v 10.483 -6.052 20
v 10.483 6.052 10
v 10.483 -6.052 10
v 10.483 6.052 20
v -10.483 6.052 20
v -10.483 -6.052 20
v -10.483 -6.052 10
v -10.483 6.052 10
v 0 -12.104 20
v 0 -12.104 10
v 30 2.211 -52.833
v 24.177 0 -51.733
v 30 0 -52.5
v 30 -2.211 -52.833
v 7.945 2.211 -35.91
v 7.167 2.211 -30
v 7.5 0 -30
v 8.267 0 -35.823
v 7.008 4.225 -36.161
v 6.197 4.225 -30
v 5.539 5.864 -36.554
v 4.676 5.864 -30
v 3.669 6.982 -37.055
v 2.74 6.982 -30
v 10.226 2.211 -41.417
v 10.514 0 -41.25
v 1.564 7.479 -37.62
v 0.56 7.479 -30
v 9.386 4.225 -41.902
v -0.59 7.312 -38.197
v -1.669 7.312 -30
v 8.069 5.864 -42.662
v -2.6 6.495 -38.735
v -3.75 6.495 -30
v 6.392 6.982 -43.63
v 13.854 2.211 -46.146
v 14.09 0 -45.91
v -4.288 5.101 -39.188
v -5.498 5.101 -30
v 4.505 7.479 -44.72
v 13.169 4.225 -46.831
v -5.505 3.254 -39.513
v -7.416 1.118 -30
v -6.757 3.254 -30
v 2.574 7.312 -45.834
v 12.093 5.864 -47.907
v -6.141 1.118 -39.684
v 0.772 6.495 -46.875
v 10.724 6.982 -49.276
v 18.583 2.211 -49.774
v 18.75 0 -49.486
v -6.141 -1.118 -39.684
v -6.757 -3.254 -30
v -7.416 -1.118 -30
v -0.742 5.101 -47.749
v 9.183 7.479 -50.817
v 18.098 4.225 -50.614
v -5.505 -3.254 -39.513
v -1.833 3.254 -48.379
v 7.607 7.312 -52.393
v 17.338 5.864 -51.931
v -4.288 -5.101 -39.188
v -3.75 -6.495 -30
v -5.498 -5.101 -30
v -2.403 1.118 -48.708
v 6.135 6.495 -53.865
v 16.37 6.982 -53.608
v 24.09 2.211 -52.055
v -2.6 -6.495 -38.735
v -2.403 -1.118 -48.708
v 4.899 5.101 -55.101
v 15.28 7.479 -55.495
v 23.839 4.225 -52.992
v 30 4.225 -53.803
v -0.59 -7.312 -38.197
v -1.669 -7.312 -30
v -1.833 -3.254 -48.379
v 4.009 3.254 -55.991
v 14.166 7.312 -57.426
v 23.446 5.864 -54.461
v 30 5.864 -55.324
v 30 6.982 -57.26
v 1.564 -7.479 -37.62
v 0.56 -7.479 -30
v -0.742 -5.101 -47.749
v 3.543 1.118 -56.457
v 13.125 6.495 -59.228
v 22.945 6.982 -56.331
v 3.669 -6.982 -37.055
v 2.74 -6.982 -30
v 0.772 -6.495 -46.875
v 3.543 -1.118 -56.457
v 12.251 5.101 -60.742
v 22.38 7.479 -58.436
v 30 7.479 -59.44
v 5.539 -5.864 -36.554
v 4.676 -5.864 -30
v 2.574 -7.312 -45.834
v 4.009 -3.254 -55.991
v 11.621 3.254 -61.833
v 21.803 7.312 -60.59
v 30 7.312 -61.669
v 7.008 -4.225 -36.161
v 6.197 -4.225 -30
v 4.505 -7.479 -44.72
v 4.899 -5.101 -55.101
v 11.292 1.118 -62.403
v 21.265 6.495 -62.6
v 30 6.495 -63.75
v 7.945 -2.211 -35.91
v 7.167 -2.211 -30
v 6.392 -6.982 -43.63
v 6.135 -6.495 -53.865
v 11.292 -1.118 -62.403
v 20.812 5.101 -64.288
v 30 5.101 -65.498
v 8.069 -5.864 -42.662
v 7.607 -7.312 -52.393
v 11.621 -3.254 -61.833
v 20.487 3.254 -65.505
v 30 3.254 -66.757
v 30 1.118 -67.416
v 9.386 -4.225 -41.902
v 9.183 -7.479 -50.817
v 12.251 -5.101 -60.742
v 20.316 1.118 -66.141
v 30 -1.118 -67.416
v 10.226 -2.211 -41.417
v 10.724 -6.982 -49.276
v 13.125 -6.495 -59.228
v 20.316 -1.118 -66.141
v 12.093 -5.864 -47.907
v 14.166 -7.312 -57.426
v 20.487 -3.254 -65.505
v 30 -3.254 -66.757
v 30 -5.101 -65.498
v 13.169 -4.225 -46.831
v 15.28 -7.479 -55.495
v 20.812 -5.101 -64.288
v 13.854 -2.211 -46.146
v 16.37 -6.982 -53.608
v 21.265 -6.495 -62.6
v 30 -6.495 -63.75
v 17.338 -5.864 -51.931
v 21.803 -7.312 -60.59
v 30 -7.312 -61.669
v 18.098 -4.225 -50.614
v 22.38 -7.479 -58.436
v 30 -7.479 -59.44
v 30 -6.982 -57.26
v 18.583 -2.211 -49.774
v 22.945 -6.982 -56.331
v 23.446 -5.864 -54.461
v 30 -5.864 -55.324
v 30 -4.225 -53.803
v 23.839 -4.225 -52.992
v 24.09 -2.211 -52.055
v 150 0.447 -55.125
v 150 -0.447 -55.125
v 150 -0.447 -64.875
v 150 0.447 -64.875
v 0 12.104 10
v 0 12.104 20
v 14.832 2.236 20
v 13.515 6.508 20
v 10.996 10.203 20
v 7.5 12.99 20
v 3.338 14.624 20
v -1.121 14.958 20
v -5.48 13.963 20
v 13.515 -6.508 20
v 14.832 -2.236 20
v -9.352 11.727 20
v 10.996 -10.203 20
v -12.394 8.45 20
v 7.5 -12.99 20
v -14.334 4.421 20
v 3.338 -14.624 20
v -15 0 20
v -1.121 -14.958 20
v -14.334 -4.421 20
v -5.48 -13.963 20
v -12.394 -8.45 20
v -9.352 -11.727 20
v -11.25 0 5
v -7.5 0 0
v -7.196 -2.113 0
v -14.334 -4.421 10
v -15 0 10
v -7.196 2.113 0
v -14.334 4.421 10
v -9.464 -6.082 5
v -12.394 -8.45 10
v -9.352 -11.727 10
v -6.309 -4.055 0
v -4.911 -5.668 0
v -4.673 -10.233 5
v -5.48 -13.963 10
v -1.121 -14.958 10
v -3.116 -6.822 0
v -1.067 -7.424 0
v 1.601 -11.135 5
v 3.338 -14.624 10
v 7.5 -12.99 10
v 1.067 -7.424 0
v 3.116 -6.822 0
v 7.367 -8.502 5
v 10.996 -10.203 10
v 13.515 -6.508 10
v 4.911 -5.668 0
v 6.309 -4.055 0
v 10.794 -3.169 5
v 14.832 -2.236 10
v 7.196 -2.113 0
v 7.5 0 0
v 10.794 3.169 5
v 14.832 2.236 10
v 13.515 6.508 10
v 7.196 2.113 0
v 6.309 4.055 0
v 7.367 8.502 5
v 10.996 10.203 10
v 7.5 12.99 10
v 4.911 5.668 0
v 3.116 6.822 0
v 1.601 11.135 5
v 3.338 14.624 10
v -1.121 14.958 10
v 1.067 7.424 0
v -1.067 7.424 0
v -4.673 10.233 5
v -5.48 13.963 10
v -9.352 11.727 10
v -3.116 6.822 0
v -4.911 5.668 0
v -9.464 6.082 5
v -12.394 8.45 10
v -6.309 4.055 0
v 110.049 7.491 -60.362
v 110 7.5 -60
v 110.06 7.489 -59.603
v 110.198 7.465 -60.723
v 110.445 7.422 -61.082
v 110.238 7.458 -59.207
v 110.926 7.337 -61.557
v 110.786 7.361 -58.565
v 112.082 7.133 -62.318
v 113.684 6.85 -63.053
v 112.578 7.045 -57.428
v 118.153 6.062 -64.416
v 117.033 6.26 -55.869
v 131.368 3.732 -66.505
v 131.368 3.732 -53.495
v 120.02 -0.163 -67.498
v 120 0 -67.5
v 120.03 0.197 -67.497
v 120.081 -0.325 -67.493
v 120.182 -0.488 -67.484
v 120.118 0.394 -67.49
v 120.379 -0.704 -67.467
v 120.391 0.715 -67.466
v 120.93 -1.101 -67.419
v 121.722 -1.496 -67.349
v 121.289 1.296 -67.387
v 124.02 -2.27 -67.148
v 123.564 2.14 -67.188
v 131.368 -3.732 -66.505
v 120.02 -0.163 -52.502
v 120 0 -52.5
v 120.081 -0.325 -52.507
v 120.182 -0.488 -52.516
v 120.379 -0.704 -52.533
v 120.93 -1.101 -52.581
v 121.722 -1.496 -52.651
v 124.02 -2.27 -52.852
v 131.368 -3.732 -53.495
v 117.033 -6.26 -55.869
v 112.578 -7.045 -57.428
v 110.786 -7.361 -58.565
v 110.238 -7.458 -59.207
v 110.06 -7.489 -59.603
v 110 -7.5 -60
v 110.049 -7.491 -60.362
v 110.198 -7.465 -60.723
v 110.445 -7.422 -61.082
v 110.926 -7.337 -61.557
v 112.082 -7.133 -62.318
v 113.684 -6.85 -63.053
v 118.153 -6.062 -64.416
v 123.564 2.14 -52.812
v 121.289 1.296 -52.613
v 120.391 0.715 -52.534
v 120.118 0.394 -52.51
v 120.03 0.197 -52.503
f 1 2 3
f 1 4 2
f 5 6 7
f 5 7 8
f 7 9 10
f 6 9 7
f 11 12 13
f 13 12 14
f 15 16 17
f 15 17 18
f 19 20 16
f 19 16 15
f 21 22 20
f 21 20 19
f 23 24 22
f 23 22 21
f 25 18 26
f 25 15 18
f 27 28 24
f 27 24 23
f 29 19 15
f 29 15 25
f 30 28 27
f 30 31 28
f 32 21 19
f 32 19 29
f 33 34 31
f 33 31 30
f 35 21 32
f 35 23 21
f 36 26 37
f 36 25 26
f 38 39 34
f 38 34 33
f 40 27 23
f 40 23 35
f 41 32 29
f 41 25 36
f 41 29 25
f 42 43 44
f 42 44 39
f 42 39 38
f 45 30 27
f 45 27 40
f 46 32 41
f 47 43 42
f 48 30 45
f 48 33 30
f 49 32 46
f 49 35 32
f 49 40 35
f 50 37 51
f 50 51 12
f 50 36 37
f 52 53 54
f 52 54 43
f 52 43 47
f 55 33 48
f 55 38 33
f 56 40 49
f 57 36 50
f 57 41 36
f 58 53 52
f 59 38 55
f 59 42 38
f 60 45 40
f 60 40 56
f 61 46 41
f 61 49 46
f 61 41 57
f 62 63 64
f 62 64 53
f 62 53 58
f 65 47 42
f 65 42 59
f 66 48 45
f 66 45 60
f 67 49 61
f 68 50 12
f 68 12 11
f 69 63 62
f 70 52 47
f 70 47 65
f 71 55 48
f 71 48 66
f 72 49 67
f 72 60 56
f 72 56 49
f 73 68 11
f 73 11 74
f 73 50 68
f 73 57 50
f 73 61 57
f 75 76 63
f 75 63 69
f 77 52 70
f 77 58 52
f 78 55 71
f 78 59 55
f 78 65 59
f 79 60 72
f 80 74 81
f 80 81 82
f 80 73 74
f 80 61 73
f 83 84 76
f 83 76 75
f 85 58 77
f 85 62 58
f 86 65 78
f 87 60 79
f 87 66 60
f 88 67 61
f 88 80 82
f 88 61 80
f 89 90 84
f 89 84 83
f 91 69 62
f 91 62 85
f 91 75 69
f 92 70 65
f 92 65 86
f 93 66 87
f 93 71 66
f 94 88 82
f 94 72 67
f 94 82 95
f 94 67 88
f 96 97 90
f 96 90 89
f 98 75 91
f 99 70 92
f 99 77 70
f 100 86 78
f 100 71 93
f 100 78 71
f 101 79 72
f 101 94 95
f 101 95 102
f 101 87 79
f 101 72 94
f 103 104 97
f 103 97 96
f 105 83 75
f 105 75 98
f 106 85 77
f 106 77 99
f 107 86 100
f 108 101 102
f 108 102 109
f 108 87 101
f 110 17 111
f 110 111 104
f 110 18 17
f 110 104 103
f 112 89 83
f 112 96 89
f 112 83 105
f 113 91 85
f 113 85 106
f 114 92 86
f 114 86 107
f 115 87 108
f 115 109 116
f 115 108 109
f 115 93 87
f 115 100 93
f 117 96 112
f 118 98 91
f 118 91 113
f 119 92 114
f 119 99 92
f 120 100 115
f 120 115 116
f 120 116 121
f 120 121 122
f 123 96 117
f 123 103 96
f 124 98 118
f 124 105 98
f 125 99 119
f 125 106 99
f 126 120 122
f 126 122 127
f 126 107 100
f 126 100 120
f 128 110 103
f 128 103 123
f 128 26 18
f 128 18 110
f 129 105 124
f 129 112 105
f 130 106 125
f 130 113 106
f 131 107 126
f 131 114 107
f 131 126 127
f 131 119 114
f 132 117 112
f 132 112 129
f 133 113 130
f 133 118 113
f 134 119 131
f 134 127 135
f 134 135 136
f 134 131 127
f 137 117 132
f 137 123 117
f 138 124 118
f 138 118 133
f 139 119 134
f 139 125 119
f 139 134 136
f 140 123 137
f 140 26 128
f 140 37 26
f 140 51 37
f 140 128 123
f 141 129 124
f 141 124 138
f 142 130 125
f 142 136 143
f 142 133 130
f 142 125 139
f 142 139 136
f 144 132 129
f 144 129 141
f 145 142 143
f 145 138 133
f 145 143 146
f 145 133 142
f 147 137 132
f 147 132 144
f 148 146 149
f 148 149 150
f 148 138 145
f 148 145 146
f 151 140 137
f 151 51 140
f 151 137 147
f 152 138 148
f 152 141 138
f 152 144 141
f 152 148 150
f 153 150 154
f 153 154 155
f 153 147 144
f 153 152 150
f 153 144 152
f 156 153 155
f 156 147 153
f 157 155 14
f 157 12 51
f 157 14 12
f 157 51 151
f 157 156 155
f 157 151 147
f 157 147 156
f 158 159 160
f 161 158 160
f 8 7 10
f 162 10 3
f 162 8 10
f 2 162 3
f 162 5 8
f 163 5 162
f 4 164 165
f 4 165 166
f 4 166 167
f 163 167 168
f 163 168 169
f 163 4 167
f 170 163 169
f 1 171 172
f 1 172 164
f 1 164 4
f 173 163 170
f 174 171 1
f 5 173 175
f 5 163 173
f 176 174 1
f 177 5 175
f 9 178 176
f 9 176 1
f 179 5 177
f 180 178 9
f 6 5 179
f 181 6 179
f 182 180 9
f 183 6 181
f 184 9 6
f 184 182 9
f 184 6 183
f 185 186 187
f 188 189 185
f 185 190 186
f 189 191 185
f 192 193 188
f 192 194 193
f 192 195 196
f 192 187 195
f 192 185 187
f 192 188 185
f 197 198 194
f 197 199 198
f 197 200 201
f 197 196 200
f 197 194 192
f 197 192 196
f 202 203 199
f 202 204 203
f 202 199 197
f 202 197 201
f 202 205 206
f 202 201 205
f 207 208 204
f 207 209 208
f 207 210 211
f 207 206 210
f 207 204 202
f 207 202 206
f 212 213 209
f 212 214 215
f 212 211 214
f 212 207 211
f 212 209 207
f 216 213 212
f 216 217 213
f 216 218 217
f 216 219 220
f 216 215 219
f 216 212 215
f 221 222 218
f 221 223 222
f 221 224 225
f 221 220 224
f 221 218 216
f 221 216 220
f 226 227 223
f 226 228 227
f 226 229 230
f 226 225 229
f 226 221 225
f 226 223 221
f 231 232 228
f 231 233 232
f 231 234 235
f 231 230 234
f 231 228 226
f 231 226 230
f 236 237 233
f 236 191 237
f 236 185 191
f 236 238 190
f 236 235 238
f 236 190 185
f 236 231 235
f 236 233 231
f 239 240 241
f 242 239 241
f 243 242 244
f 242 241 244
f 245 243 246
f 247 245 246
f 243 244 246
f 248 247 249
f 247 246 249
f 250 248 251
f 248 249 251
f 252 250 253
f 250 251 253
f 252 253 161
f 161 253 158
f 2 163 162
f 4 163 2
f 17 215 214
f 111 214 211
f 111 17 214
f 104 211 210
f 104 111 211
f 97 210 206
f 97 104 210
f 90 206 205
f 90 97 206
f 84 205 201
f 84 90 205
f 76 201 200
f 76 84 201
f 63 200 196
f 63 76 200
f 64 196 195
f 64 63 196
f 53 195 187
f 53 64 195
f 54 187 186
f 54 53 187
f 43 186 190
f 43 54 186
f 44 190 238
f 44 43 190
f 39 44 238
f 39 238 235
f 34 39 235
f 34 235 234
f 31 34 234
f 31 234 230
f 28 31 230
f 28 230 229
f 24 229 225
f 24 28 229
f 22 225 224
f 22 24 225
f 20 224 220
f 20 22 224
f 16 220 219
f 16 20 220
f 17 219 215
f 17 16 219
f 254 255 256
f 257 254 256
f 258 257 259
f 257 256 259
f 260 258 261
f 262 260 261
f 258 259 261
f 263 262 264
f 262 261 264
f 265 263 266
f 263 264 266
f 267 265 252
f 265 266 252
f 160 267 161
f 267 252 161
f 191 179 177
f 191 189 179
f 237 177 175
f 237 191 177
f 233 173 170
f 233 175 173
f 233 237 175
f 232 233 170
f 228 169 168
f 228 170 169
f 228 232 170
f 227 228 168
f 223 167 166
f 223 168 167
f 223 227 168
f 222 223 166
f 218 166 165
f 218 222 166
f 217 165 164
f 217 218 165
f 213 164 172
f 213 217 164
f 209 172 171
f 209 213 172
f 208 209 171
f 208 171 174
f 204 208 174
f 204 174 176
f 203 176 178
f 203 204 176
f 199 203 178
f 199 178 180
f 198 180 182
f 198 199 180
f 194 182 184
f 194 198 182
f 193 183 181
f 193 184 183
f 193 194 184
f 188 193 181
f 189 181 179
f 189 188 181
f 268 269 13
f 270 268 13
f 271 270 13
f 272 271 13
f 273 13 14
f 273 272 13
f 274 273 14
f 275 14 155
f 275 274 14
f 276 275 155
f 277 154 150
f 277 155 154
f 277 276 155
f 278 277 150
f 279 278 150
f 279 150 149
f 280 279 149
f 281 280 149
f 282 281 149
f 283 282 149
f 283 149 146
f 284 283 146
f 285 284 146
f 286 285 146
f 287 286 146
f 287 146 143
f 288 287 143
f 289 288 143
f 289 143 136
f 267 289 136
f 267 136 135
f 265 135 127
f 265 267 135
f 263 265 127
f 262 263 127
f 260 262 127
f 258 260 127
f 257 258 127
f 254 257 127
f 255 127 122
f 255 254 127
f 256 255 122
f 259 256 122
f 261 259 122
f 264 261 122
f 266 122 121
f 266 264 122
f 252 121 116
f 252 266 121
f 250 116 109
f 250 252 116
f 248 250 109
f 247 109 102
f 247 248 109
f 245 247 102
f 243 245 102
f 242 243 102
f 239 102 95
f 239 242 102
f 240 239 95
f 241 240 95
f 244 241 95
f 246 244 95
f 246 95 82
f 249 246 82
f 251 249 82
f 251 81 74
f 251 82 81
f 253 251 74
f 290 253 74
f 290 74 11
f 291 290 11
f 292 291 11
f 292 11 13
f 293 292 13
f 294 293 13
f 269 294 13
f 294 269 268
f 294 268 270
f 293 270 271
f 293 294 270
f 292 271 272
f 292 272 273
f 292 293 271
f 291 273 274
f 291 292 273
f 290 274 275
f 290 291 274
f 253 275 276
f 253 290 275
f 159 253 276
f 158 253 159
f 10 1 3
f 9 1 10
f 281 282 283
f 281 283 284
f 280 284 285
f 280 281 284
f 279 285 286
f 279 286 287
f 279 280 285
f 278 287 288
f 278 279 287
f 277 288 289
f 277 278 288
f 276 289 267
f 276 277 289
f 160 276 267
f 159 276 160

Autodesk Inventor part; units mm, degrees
ref_plane "YZ Plane" through (0, 0, 0) normal (1, 0, 0) x (0, 1, 0)
ref_plane "XZ Plane" through (0, 0, 0) normal (0, 1, 0) x (-1, 0, 0)
ref_plane "XY Plane" through (0, 0, 0) normal (0, 0, 1) x (1, 0, 0)
sketch "Эскиз1" plane through (0, 0, 0) normal (0, 1, 0) x (-1, 0, 0)
  line L0 (0, 0) -> (0, -30)
  line L1 (-30, -60) -> (-150, -60)
  arc A0 (-30, -60) -> (0, -30) centre (-30, -30) ccw
  point P0 (0, -60)
  dimension "d0" = 60
  dimension "d1" = 150
  dimension "d2" = 30
sketch "Эскиз2" plane through (0, 0, 0) normal (0, 0, 1) x (1, 0, 0)
  circle A0 centre (0, 0) radius 7.5
  dimension "d3" = 15
sweep "Сдвиг1" add profiles "Эскиз2" path "Эскиз1"
sketch "Эскиз3" plane through (0, 0, 0) normal (0, 1, 0) x (-1, 0, 0)
  line L0 (-120, -52.5) -> (-150, -55.1247)
  line L1 (-120, -67.5) -> (-150, -64.8753)
  line L2 (-150, -64.8753) -> (-150, -55.1247)
  line L3 (-150, -52.5) -> (-150, -67.5) projected
  line L4 (-120, -52.5) -> (-150.8821, -45.0422)
  line L5 (-150.8821, -45.0422) -> (-158.2895, -61.433)
  line L6 (-158.2895, -61.433) -> (-150, -78.5011)
  line L7 (-150, -78.5011) -> (-120, -67.5)
  point P0 (0, 0)
extrude "Выдавливание1" cut sketch "Эскиз3" against normal mid plane 40
sketch "Эскиз4" plane through (0, 0, 0) normal (0, 0, 1) x (1, 0, 0)
  line L0 (30, 7.5) -> (150, 7.5) projected
  line L1 (110, 7.5) -> (150.3931, 7.5) construction
  line L2 (30, -7.5) -> (150, -7.5) projected
  line L3 (110, 7.5) -> (159.1062, 20.8998)
  line L4 (159.1062, 20.8998) -> (172.0854, -18.5057)
  line L5 (172.0854, -18.5057) -> (124.0272, -32.5373)
  line L6 (124.0272, -32.5373) -> (110, -7.5)
  line L7 (110, 7.5) -> (150, 0.4469)
  line L8 (150, -5.6992) -> (150, 5.6992) projected
  line L9 (110, 7.5) -> (150.6171, 7.5) construction
  line L10 (110, -7.5) -> (150, -0.4469)
  line L11 (150, 0.4469) -> (150, -0.4469)
  point P0 (0, 0)
  dimension "d13" = 10
extrude "Выдавливание2" cut sketch "Эскиз4" against normal blind 120
sketch "Эскиз5" plane through (0, 0, 0) normal (0, 1, 0) x (-1, 0, 0)
  line L0 (0, 0) -> (0, 20)
  line L1 (0, 20) -> (15, 20)
  line L2 (15, 20) -> (15, 10)
  line L3 (7.5, 0) -> (-7.5, 0) projected
  line L4 (7.5, 0) -> (15, 10)
  dimension "d14" = 20
  dimension "d15" = 15
  dimension "d16" = 10
revolve "Вращение1" add sketch "Эскиз5" angle 360 about axis through (0, 0, 0) along (0, 0, 1)
sketch "Эскиз10" plane through (0, 0, 20) normal (0, 0, 1) x (1, 0, 0)
  line L0 (0, 12.1042) -> (10.4826, 6.0521)
  line L1 (10.4826, 6.0521) -> (10.4826, -6.0521)
  line L2 (10.4826, -6.0521) -> (0, -12.1042)
  line L3 (0, -12.1042) -> (-10.4826, -6.0521)
  line L4 (-10.4826, -6.0521) -> (-10.4826, 6.0521)
  line L5 (-10.4826, 6.0521) -> (0, 12.1042)
  point P0 (0, 0)
  point P1 (0, 0)
extrude "Выдавливание3" cut sketch "Эскиз10" against normal blind 10
properties part number "ключ" material "Сталь, гальванизированная"
